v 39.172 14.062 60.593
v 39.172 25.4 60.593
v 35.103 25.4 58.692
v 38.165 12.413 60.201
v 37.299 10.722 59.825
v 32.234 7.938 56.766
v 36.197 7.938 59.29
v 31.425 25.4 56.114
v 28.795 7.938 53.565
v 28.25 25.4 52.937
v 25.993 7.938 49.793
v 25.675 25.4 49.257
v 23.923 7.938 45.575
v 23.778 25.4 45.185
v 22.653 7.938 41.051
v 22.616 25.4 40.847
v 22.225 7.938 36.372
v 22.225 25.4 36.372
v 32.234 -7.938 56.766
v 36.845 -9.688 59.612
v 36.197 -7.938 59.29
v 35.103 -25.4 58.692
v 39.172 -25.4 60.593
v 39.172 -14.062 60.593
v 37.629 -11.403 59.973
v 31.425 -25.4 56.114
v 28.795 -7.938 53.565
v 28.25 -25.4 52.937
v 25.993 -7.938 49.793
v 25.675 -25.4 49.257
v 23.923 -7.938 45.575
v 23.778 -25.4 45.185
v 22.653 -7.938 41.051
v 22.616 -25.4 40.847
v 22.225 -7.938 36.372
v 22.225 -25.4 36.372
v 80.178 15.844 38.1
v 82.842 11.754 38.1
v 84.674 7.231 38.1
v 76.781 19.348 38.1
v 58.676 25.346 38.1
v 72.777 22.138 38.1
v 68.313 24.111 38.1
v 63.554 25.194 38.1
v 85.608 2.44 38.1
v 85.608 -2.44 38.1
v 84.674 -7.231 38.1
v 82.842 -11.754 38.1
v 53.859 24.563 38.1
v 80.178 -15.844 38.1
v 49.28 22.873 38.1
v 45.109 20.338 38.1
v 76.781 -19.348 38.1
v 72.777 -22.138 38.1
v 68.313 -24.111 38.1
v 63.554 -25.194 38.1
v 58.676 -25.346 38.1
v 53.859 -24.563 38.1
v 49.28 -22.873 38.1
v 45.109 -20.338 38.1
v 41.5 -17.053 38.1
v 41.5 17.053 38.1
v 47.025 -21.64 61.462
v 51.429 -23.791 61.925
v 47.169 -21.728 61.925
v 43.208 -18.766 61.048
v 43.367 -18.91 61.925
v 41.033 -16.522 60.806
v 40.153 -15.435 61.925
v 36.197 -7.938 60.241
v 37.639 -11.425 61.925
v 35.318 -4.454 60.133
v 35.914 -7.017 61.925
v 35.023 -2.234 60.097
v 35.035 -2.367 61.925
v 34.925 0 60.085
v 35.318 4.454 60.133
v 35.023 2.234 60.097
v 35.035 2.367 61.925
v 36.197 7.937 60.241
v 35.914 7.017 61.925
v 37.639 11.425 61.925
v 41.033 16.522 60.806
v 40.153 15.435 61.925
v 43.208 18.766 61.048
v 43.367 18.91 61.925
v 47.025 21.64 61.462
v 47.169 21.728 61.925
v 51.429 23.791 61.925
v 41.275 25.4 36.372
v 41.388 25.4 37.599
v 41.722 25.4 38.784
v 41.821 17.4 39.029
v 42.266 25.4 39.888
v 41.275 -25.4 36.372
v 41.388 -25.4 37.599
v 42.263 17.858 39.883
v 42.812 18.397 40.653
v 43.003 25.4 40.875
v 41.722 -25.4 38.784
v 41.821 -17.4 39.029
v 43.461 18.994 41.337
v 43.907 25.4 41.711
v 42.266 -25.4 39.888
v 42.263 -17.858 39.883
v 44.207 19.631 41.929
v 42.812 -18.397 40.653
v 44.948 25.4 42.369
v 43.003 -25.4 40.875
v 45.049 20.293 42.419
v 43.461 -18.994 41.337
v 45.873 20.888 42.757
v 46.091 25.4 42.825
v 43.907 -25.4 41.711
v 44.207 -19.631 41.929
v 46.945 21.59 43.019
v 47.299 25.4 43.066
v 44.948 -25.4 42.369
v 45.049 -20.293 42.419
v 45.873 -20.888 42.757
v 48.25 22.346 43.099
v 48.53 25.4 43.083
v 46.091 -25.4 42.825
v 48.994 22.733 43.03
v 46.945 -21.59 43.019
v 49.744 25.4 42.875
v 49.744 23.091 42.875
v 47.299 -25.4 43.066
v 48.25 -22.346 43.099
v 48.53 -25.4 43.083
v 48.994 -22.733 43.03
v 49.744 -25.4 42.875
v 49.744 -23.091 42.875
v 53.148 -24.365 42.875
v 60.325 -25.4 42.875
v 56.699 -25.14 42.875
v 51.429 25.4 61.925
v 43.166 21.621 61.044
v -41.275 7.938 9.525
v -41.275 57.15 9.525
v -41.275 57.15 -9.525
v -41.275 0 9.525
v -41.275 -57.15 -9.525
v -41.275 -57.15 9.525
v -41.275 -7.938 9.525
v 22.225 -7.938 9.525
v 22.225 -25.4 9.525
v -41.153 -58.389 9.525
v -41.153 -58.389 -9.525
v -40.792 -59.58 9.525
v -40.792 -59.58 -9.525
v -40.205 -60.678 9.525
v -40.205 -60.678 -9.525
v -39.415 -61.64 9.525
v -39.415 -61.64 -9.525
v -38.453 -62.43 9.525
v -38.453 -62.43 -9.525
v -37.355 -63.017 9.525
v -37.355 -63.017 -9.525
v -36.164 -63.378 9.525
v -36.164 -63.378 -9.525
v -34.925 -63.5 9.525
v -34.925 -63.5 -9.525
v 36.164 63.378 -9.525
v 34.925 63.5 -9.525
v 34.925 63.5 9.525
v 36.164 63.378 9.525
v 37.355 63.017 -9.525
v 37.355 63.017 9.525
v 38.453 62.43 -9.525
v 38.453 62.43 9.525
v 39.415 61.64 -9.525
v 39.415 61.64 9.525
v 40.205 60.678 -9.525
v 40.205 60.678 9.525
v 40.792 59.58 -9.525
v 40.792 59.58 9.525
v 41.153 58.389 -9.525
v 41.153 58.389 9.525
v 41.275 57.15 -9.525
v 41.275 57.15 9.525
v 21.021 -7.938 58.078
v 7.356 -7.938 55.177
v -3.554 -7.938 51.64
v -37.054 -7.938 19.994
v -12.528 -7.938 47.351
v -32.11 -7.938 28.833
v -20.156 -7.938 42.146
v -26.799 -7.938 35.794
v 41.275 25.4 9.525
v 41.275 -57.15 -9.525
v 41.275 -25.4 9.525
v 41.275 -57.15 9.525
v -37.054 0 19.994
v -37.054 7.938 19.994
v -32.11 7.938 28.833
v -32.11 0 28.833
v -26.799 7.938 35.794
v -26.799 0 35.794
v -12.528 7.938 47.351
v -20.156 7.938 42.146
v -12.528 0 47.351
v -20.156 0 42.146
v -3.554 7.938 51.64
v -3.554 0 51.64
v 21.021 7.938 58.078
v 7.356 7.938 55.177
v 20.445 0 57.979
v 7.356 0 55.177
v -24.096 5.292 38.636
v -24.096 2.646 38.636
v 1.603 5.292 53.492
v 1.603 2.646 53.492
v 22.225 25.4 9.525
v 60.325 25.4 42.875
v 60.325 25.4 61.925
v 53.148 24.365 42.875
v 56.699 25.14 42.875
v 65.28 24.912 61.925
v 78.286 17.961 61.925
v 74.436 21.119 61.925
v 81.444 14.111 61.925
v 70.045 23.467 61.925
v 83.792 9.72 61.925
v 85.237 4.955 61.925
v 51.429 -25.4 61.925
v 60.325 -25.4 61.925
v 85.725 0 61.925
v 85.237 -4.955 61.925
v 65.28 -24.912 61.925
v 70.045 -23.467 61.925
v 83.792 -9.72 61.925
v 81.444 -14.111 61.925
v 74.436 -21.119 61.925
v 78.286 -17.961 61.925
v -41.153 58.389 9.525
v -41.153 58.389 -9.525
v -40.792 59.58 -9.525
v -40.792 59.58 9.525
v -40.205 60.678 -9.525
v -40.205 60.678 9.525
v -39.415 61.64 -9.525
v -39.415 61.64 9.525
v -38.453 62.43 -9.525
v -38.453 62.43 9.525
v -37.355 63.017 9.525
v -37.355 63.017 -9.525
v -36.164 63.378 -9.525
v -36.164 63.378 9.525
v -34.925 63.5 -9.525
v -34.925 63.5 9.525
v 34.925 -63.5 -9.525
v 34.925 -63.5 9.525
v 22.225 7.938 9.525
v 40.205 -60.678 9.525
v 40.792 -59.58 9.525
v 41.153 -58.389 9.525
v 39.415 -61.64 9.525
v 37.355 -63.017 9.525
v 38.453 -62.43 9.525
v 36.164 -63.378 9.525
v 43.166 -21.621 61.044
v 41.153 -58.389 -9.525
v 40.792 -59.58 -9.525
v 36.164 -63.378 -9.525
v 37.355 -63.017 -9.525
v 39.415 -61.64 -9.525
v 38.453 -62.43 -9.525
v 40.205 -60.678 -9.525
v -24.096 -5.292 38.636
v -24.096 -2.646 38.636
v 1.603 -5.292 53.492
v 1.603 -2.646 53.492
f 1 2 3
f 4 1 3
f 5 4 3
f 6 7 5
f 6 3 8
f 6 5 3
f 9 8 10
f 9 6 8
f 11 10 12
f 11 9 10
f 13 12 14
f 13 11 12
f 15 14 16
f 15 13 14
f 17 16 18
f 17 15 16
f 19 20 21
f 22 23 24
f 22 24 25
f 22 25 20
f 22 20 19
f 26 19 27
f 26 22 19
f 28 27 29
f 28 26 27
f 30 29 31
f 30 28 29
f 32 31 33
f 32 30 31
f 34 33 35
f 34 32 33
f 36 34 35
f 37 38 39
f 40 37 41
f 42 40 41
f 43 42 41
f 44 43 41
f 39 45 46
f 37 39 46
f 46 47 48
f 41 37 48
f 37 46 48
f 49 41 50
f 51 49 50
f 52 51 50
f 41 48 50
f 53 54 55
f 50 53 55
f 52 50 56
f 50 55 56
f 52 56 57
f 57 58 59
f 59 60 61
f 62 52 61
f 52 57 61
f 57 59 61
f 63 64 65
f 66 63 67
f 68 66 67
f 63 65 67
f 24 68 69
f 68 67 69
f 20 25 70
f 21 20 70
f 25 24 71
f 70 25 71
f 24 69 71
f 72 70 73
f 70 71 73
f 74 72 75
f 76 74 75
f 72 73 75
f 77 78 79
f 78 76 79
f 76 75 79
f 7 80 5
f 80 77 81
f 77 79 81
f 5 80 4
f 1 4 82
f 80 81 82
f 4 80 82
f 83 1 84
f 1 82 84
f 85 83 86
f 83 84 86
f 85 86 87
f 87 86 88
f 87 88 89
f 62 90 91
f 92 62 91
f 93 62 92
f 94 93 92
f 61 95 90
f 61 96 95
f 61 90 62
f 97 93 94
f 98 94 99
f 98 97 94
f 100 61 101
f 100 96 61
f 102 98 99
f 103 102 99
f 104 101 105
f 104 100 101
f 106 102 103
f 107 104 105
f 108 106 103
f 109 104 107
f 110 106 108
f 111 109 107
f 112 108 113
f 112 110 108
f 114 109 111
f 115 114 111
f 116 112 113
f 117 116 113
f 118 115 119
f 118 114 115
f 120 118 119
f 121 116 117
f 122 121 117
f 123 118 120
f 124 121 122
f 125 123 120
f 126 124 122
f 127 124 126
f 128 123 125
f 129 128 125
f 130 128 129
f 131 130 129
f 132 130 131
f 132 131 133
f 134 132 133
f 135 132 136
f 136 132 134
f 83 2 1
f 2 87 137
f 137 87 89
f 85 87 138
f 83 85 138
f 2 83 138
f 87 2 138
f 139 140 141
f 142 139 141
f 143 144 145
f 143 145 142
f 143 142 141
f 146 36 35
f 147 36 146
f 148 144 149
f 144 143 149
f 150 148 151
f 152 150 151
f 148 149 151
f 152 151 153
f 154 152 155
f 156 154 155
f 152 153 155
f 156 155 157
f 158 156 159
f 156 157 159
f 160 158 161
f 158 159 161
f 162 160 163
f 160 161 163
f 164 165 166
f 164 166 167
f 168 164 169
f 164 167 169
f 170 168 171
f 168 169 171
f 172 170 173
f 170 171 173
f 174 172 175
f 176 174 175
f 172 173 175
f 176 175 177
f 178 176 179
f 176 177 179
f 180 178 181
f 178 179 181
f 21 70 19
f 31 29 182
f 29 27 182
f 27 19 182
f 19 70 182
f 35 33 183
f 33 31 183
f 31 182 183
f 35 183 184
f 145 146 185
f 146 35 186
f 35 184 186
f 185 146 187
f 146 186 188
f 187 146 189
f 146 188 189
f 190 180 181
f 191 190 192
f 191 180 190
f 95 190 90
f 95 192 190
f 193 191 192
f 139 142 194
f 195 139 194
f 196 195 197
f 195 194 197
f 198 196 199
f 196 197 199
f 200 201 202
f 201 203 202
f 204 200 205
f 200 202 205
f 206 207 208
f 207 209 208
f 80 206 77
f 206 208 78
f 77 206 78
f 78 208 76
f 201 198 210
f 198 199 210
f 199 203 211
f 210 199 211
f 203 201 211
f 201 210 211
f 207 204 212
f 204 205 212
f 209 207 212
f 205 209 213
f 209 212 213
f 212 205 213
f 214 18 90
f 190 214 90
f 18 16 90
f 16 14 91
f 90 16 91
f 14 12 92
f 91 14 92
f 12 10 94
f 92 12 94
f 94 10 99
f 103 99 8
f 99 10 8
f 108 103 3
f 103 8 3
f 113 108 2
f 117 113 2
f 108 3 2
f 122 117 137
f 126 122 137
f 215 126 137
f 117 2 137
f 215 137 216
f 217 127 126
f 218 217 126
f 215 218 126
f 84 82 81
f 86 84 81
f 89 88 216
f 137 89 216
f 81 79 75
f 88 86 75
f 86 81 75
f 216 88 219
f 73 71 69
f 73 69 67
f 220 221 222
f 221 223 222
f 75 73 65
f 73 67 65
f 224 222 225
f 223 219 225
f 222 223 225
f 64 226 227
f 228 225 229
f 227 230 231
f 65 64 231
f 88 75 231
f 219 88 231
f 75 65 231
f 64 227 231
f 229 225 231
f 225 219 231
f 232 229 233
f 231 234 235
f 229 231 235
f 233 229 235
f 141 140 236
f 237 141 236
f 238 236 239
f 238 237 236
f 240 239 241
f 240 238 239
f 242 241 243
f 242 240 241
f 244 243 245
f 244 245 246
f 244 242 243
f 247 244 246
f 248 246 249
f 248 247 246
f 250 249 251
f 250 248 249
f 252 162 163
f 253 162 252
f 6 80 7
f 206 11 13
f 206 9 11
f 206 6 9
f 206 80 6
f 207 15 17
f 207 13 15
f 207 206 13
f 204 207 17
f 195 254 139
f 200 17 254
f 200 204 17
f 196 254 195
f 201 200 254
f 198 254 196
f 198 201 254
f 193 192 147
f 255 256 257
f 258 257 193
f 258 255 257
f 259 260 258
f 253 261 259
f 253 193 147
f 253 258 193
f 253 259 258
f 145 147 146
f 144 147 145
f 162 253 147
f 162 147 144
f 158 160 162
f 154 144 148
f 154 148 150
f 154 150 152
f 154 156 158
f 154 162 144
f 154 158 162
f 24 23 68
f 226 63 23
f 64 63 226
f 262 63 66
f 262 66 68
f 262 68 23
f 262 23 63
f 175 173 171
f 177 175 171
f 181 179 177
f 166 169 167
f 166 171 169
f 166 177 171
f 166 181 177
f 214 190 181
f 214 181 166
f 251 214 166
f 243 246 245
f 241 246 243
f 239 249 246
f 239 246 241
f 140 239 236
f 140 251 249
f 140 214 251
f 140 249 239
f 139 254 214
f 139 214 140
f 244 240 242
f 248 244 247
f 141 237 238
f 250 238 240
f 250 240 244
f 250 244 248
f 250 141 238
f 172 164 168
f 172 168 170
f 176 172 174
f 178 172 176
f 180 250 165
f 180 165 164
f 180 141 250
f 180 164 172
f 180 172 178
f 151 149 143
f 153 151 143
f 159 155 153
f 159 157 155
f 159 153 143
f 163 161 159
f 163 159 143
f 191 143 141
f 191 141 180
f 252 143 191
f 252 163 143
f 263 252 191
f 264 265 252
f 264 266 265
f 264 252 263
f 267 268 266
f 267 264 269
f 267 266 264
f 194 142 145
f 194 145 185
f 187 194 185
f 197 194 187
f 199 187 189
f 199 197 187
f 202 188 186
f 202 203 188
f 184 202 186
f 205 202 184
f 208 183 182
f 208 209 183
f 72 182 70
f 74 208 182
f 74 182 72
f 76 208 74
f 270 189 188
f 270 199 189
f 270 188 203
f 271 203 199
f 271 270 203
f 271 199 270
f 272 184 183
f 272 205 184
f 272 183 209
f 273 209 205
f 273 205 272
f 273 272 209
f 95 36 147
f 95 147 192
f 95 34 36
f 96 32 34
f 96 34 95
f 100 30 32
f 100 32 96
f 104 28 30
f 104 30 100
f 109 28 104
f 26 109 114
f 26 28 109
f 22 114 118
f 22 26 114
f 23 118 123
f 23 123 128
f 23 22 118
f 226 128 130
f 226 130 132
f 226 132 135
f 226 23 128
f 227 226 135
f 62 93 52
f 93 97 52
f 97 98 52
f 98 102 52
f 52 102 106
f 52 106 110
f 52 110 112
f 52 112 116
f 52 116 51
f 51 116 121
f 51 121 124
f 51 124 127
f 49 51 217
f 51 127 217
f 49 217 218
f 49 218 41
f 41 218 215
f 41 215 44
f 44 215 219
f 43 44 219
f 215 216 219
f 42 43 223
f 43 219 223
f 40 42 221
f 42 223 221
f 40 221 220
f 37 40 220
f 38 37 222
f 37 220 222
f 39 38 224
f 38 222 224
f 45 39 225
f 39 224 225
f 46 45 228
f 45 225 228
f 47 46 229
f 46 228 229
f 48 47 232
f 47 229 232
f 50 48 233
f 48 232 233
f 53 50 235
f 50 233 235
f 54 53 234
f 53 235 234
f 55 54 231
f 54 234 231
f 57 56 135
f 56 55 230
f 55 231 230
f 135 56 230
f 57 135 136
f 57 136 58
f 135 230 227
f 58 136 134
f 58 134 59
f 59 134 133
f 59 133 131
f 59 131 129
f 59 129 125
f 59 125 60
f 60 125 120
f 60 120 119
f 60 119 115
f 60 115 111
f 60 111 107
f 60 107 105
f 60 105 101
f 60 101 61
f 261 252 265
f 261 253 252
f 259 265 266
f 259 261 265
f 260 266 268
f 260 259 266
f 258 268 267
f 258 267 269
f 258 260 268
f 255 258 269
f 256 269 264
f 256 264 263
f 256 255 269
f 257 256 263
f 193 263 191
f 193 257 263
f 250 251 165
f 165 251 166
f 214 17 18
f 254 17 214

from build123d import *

# Parameters (mm, degrees)
F1_DEPTH = 63.5
F2_DEPTH = 25.4
F3_DEPTH = 7.9375
F5_R     = 6.35


with BuildPart() as f1:
    # F0 (on Front) → F1 (new body, symmetric)
    with BuildSketch(Plane.XZ):
        Polygon((22.225, 9.525), (-41.275, 9.525), (-41.275, -9.525), (41.275, -9.525), (41.275, 9.525), align=None)
    extrude(amount=F1_DEPTH, both=True)

    # F0 (on Front) → F2 (join, symmetric)
    with BuildSketch(Plane.XZ):
        with BuildLine():
            Line((22.225, 36.372416), (22.225, 9.525))
            Line((22.225, 9.525), (41.275, 9.525))
            Line((41.275, 9.525), (41.275, 36.372416))
            ThreePointArc((41.275, 36.372416), (43.906682, 41.711138), (49.743862, 42.8752))
            Line((49.743862, 42.8752), (60.325, 42.8752))
            Line((60.325, 42.8752), (60.325, 61.9252))
            Line((60.325, 61.9252), (51.428748, 61.9252))
            add(Edge.make_bspline(
                [(39.172455, 60.59283), (43.120534, 61.049962), (47.205418, 61.485125), (51.428748, 61.9252)],
                knots=[97.106887, 97.106887, 97.106887, 97.106887, 106.488336, 106.488336, 106.488336, 106.488336], degree=3))
            ThreePointArc((39.172455, 60.59283), (26.882582, 51.152848), (22.225, 36.372416))
        make_face()
    extrude(amount=F2_DEPTH, both=True)

    # F0 (on Front) → F3 (join, symmetric)
    with BuildSketch(Plane.XZ):
        with BuildLine():
            add(Edge.make_bspline(
                [(-41.275, 9.525), (-27.90281, 48.775516), (-1.693912, 55.861078), (39.172455, 60.59283)],
                knots=[0, 0, 0, 0, 97.106887, 97.106887, 97.106887, 97.106887], degree=3))
            Line((-41.275, 9.525), (22.225, 9.525))
            Line((22.225, 9.525), (22.225, 36.372416))
            ThreePointArc((22.225, 36.372416), (26.882582, 51.152848), (39.172455, 60.59283))
        make_face()
    extrude(amount=F3_DEPTH, both=True)

    # F0 (on Front) → F4 (revolve)
    with BuildSketch(Plane.XZ):
        Polygon((85.725, 61.9252), (60.325, 61.9252), (60.325, 42.8752), (60.325, 38.1), (85.725, 38.1), align=None)
    revolve(axis=Axis((60.325, 0, 52.3875), (0, 0, -1)))

    # F5
    f5_edges = [f1.edges().sort_by_distance(p)[0] for p in [
        (41.275, -63.5, 0),
        (-41.275, -63.5, 0),
        (-41.275, 63.5, 0),
        (41.275, 63.5, 0),
    ]]
    fillet(f5_edges, radius=F5_R)


solid = f1.part
